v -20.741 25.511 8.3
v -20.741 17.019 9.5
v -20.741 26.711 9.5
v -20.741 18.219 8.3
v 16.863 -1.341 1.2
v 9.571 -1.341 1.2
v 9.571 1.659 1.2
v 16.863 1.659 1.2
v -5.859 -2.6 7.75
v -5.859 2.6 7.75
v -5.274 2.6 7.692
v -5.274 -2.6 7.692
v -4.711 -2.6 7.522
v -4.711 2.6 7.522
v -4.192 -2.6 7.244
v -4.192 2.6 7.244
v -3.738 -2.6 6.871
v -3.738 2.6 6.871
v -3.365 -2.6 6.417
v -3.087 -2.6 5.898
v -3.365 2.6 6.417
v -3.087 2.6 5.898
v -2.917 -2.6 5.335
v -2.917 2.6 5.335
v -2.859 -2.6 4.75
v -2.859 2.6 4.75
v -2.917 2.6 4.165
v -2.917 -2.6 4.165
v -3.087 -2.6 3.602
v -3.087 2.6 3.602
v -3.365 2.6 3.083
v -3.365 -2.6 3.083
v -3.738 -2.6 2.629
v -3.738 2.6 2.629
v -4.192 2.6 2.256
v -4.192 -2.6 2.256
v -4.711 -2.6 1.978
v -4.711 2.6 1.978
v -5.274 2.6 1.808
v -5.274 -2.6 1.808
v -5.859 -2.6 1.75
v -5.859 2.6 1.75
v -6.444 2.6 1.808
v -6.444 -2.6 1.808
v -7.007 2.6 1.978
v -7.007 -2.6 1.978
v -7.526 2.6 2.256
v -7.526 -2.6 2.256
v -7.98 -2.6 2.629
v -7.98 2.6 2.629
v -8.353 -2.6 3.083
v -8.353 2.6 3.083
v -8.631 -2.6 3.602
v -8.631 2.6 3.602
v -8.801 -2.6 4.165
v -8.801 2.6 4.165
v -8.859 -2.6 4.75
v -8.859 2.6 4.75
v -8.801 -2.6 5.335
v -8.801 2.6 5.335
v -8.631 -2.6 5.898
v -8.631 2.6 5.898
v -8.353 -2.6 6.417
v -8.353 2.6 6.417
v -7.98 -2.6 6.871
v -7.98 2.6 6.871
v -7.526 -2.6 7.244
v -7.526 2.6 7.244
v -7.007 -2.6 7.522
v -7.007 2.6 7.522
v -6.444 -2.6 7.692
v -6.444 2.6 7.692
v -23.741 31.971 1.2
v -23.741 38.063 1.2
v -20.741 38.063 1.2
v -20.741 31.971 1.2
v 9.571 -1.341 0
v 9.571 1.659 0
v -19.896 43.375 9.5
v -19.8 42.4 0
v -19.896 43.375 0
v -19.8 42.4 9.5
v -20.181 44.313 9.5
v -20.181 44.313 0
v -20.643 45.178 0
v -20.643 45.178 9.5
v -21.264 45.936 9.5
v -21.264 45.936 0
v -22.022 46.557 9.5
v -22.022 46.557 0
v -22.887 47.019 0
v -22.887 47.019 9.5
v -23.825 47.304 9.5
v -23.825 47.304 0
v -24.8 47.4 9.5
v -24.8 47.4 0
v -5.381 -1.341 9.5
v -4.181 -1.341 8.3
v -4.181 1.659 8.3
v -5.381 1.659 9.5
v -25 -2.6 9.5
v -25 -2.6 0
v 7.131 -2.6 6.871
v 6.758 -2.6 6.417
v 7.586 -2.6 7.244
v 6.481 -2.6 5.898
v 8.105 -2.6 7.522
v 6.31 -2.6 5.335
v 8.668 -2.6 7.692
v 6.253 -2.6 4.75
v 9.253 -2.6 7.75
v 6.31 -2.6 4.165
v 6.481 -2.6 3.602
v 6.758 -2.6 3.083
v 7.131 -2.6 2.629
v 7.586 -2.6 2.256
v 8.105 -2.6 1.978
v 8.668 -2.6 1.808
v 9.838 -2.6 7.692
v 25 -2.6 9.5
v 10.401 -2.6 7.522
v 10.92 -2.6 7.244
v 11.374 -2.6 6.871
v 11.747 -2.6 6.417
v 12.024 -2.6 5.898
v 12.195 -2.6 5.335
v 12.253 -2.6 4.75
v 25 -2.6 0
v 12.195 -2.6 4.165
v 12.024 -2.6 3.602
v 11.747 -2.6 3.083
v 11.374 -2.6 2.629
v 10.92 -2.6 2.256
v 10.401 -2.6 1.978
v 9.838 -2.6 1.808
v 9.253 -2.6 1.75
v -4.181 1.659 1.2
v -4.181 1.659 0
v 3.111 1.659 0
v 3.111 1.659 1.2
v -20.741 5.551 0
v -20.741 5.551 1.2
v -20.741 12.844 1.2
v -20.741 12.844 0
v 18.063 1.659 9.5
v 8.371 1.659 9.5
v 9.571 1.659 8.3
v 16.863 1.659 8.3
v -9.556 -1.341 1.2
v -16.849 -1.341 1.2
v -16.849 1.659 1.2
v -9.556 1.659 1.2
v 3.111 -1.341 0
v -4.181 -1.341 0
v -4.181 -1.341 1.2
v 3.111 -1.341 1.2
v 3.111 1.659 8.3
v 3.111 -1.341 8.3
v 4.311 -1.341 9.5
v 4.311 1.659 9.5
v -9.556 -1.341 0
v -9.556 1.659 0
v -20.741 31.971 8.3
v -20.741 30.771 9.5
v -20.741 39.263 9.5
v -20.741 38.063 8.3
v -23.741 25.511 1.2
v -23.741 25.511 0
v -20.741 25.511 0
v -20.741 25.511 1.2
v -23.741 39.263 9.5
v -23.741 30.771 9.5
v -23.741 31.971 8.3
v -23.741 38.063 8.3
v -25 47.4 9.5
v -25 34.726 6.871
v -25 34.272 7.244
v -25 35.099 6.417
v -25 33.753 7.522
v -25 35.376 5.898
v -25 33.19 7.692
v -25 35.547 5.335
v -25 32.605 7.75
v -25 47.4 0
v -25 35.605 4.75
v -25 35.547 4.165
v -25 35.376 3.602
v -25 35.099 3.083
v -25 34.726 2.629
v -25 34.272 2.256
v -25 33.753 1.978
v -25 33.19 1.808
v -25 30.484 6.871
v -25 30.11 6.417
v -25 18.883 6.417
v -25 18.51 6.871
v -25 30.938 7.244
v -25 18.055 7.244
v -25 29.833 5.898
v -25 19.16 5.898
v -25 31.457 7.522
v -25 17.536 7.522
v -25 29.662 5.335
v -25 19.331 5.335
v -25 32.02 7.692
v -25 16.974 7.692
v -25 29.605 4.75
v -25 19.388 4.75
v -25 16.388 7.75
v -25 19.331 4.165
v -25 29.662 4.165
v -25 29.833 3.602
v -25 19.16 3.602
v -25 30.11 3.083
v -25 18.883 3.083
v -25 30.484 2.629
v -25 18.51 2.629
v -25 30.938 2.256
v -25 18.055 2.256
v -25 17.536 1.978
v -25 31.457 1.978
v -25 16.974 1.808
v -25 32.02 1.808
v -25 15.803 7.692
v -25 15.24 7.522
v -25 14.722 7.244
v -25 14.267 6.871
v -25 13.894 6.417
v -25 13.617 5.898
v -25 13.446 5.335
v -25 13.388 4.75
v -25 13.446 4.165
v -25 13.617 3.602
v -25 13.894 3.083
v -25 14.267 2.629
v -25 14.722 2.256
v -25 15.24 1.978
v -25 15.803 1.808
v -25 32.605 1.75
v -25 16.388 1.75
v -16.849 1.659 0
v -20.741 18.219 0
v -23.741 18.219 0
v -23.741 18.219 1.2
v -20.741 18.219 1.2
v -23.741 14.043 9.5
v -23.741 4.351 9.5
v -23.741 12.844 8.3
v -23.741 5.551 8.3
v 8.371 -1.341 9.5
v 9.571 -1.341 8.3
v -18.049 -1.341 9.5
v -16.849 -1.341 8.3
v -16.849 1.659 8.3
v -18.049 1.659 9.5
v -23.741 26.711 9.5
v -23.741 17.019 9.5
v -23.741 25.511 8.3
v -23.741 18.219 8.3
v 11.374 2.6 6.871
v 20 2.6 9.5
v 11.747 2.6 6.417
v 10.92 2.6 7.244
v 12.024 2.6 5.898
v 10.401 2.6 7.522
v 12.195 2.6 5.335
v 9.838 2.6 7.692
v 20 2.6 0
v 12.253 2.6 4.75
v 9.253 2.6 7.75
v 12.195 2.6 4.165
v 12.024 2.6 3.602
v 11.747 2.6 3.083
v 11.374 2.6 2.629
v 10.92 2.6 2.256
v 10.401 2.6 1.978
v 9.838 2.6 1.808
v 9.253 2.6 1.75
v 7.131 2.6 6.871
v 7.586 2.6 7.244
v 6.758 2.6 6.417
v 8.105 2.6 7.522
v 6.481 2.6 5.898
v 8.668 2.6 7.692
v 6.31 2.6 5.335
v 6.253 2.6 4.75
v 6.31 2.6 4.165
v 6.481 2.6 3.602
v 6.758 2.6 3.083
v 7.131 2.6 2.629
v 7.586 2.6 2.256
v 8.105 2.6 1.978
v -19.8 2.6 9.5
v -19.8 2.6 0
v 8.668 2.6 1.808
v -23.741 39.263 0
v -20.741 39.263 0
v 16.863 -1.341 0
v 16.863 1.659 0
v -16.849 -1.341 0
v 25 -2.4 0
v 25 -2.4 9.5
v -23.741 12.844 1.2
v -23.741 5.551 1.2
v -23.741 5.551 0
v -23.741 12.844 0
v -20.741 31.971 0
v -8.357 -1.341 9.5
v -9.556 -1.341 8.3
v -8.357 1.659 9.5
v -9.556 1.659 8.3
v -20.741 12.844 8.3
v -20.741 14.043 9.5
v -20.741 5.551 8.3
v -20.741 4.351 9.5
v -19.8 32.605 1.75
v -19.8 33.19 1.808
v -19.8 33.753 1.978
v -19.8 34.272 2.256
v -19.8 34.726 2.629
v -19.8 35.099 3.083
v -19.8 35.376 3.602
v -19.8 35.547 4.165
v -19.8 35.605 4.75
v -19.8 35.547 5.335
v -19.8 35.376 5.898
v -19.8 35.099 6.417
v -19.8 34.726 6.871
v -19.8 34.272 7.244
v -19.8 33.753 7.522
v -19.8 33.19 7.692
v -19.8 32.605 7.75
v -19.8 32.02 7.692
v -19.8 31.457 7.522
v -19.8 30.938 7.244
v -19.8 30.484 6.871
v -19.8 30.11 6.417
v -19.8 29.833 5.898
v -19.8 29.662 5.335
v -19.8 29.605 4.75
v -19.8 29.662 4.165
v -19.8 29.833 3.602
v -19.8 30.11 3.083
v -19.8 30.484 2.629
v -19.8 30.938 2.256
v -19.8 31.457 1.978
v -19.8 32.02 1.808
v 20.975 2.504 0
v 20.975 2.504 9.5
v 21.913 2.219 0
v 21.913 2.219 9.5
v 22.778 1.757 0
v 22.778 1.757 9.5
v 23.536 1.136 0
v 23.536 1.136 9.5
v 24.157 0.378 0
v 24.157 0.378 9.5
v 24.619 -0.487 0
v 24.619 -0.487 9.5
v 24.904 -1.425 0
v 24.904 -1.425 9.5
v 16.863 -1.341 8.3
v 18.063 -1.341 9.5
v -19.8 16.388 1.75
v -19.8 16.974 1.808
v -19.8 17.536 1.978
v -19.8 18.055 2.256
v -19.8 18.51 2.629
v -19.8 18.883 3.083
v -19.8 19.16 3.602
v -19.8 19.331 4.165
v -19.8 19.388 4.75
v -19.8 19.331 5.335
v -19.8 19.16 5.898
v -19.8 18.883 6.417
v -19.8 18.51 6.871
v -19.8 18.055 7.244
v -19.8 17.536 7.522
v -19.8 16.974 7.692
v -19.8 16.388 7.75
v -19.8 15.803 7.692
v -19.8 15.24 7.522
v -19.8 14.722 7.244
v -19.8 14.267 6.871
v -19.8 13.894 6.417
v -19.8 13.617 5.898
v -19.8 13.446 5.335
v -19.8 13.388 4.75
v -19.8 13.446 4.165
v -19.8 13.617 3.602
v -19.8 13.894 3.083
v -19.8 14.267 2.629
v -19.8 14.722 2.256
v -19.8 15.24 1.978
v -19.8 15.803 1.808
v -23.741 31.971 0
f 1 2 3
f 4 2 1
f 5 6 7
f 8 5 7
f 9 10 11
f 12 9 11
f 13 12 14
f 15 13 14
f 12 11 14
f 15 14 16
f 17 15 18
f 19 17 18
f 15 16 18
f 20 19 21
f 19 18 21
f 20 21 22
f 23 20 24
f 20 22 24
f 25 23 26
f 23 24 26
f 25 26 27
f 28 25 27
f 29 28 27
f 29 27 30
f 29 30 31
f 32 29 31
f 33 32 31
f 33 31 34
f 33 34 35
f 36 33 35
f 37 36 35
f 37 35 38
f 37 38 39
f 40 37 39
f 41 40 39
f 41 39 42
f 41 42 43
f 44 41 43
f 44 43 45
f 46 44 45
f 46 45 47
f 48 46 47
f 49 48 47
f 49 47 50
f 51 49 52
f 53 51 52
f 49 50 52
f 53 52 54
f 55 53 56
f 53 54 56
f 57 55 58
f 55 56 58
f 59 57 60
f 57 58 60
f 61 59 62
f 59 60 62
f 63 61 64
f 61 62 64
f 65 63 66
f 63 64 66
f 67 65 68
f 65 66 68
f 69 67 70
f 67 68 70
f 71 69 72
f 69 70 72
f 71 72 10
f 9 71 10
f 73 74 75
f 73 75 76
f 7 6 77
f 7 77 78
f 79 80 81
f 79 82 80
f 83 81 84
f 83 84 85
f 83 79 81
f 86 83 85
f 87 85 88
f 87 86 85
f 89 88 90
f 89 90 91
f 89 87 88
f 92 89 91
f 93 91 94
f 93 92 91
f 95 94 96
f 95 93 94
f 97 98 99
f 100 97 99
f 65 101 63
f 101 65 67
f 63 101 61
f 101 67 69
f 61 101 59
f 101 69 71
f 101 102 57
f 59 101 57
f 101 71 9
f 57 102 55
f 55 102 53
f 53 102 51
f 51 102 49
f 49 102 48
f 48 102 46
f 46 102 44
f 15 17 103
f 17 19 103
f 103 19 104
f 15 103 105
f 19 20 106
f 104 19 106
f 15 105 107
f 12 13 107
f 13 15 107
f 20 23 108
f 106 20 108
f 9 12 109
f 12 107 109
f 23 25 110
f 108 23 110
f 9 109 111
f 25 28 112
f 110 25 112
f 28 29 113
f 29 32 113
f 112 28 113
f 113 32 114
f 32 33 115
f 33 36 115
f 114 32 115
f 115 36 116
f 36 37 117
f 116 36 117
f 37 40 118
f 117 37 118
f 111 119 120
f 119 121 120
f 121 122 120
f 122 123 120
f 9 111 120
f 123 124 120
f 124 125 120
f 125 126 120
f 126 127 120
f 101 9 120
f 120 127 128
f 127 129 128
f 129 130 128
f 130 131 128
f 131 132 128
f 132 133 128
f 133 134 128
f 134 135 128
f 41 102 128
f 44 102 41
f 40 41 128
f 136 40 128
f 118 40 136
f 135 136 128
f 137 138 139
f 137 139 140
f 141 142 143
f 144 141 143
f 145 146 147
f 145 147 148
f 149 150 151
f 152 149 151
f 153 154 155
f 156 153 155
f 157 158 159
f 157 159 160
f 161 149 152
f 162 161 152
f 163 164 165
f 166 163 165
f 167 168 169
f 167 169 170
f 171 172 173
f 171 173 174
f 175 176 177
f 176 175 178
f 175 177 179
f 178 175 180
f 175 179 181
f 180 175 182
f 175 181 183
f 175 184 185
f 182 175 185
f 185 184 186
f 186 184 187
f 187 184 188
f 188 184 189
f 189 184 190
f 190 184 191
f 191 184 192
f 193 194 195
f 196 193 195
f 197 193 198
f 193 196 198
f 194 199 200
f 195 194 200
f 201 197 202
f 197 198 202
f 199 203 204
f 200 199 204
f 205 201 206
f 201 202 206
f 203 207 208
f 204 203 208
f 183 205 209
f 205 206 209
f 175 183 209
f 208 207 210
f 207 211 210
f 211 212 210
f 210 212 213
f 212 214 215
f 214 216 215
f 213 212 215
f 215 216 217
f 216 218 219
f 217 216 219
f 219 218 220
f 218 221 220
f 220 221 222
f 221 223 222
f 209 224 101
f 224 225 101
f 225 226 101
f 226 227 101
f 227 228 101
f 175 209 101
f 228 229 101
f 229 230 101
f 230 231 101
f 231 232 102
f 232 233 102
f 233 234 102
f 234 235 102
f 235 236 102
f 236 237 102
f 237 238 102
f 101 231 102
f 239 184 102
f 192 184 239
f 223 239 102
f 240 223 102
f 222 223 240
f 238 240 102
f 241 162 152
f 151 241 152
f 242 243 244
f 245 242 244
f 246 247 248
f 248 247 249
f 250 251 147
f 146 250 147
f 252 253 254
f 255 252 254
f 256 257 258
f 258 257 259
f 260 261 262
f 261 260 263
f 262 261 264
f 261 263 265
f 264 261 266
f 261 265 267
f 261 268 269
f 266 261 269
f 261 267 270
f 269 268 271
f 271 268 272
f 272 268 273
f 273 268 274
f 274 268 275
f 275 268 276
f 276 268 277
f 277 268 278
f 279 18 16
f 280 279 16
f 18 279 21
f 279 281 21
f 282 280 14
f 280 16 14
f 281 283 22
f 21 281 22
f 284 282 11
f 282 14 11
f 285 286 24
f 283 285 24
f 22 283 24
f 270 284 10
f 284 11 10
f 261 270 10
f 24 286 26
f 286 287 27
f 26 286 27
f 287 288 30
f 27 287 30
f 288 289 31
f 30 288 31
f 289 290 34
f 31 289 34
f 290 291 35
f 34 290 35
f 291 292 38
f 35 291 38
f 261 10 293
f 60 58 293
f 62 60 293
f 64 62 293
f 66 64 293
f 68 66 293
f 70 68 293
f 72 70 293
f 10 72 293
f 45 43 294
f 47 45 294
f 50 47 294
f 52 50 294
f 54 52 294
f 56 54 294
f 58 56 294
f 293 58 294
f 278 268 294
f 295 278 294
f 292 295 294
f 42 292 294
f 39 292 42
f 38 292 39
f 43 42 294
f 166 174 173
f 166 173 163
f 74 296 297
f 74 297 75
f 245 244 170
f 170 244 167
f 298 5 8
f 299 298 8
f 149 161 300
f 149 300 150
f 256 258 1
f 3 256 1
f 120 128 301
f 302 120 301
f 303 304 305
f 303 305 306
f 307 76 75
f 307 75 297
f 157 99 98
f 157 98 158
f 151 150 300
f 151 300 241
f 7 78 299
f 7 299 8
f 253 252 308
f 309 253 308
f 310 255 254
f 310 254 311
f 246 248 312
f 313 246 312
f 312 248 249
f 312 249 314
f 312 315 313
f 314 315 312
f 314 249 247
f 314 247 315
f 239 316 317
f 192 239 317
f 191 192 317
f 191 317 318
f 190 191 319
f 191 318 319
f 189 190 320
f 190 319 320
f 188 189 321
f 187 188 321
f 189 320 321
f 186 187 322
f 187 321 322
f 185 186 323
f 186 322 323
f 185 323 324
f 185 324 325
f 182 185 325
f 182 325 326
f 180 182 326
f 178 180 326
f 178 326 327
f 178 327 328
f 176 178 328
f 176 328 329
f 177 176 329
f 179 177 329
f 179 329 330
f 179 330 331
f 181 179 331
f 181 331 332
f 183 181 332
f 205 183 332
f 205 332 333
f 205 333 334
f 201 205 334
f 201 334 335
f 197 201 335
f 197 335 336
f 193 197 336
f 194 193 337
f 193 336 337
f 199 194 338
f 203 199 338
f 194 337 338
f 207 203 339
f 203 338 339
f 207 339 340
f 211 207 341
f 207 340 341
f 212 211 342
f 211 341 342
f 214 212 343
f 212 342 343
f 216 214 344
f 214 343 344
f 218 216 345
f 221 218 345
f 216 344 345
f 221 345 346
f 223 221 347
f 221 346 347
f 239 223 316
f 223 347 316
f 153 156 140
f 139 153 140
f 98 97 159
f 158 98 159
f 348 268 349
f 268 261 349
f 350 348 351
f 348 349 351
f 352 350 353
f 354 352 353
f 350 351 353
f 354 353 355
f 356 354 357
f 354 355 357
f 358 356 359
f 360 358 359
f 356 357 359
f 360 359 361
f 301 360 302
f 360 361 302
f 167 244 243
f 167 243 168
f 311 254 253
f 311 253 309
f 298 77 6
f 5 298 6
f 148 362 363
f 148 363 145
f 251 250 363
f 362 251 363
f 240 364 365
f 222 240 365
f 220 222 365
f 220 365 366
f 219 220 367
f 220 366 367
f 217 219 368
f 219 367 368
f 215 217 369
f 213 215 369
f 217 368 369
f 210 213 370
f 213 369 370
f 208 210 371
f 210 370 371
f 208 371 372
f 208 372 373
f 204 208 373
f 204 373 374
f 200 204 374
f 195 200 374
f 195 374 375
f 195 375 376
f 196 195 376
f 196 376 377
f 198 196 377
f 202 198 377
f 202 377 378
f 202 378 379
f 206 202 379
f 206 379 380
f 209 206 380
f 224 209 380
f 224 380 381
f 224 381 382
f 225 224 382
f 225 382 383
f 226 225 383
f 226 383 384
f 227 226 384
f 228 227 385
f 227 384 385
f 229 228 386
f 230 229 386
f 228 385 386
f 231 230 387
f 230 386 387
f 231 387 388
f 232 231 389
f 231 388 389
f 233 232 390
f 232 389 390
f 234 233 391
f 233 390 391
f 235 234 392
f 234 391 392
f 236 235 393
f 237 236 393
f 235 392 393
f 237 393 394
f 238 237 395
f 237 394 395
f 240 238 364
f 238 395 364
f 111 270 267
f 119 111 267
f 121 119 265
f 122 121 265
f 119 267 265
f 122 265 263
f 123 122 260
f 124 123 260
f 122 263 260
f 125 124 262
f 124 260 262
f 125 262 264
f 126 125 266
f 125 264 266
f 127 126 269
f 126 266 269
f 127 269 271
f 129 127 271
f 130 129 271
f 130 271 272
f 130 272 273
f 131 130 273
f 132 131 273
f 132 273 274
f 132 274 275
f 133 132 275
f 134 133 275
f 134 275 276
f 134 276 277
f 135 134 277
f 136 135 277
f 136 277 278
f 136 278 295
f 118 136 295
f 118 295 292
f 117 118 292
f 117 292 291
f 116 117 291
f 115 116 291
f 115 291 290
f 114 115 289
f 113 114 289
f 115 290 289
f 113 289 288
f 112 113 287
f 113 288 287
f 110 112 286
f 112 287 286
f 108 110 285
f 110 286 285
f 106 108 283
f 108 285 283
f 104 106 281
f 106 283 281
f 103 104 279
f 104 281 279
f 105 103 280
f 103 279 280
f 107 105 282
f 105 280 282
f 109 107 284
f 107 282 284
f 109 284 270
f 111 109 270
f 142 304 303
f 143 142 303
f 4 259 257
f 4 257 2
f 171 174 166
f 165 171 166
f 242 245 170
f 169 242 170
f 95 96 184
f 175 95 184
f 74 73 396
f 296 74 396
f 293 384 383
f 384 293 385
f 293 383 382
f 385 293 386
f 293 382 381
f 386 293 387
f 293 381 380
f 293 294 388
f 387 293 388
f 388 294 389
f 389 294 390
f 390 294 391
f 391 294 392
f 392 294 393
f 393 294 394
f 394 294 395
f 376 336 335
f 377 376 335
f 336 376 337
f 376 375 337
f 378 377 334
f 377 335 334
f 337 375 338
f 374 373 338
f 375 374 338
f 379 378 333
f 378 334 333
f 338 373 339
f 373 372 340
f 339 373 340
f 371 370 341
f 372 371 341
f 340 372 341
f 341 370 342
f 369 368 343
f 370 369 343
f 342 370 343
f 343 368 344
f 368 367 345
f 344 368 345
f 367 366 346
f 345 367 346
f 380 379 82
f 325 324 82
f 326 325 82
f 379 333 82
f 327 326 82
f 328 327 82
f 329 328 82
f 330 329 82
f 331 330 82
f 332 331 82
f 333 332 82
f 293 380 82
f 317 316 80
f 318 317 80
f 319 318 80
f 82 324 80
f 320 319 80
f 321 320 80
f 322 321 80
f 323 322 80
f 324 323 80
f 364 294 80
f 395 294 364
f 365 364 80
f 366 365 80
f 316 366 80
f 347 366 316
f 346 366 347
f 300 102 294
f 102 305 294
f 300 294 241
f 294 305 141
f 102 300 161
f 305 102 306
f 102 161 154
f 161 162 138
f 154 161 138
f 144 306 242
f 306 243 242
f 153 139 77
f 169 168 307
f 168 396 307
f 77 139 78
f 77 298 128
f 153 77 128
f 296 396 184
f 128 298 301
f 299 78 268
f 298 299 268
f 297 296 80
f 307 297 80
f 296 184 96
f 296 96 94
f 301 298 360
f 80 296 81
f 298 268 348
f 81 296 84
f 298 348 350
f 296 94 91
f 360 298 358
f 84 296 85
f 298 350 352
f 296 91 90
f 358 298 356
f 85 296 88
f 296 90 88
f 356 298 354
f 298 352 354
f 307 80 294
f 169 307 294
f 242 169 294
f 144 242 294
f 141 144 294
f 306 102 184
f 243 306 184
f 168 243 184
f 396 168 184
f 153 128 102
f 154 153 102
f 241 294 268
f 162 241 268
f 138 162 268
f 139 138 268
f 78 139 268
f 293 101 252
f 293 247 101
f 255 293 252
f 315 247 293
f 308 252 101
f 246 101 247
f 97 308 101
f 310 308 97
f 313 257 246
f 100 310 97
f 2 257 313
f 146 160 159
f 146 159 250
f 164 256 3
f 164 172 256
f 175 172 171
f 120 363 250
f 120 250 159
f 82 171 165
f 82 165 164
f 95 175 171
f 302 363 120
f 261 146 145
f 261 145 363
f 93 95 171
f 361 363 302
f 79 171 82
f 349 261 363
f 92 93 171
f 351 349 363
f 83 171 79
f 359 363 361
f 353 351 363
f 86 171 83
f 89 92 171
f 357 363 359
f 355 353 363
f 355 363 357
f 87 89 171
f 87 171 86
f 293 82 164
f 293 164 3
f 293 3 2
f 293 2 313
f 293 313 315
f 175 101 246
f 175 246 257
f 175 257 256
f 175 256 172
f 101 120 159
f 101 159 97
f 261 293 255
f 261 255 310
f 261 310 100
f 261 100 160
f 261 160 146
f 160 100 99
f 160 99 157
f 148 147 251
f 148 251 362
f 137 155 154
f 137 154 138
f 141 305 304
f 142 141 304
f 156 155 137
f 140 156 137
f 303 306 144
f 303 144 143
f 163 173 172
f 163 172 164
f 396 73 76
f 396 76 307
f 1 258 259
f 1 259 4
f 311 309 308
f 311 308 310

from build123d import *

# Parameters (mm, degrees)
EXTRUDE_1_DEPTH      = 9.5
SKETCH_2_R           = 3
CUT_EXTRUDE_1_DEPTH  = 66.909407523
SKETCH_4_R           = 3
CUT_EXTRUDE_2_DEPTH  = 53.175568995
FILLET_1_R           = 5
SKETCH_5_W           = 3
SKETCH_5_H           = 7.292258694
SKETCH_5_H_2         = 7.292258695
SKETCH_5_W_2         = 7.292258695
SKETCH_5_H_3         = 3
SKETCH_5_W_3         = 7.292258694
CUT_EXTRUDE_3_DEPTH  = 1.2
CHAMFER_1_SIZE       = 1.2
CHAMFER_2_SIZE       = 1.2
MIRROR_START         = -23.741274046
MIRROR_1_OUTLINE_W   = 7.292258694
MIRROR_1_OUTLINE_H   = 1.2
MIRROR_1_OUTLINE_W_2 = 7.292258695
MIRROR_1_DEPTH       = 3
MIRROR_START_2       = -16.84868645
MIRROR_1_2_OUTLINE_W = 3
MIRROR_1_2_OUTLINE_H = 1.2
MIRROR_1_2_DEPTH     = 7.292258695
MIRROR_START_3       = -4.181235969
MIRROR_1_3_OUTLINE_W = 3
MIRROR_1_3_OUTLINE_H = 1.2
MIRROR_1_3_DEPTH     = 7.292258694
MIRROR_START_4       = 9.571089537
MIRROR_1_4_OUTLINE_W = 3
MIRROR_1_4_OUTLINE_H = 1.2
MIRROR_1_4_DEPTH     = 7.292258694


# Read off the part's stored shape, not the designer's step: 镜向1
with BuildPart() as part:
    # 草图1 → 凸台-拉伸1 (new body)
    with BuildSketch(Plane.XY):
        Polygon((-19.8, 2.6), (-19.8, 47.4), (-25, 47.4), (-25, -2.6), (25, -2.6), (25, 2.6), align=None)
    extrude(amount=EXTRUDE_1_DEPTH)

    # 草图2 → 切除-拉伸1 (cut, through all)
    with BuildSketch(Plane(origin=(-19.8, 0, 0), x_dir=(0, 0, -1), z_dir=(1, 0, 0))):
        with Locations((-4.75, 32.604835918)):
            Circle(SKETCH_2_R)
        with Locations((-4.75, 16.388429447)):
            Circle(SKETCH_2_R)
    extrude(amount=-CUT_EXTRUDE_1_DEPTH, mode=Mode.SUBTRACT)

    # 草图4 → 切除-拉伸2 (cut, through all)
    with BuildSketch(Plane(origin=(0, 2.6, 0), x_dir=(1, 0, 0), z_dir=(0, 1, 0))):
        with Locations(Location((9.252806551, -4.75, 0), (0, 0, 270))):
            Circle(SKETCH_4_R)
        with Locations(Location((-5.859043595, -4.75, 0), (0, 0, 270))):
            Circle(SKETCH_4_R)
    extrude(amount=-CUT_EXTRUDE_2_DEPTH, mode=Mode.SUBTRACT)

    # 圆角1
    fillet_1_edges = [part.edges().sort_by_distance(p)[0] for p in [
        (-19.8, 47.4, 4.75),
        (25, 2.6, 4.75),
    ]]
    fillet(fillet_1_edges, radius=FILLET_1_R)

    # 草图5 → 切除-拉伸3 (cut)
    with BuildSketch(Plane.XY.offset(9.5)):
        with Locations((-22.241274046, 21.864893378)):
            Rectangle(SKETCH_5_W, SKETCH_5_H)
        with Locations((-22.241274046, 35.617218884)):
            Rectangle(SKETCH_5_W, SKETCH_5_H)
        with Locations((-22.241274046, 9.197442898)):
            Rectangle(SKETCH_5_W, SKETCH_5_H_2)
        with Locations((-13.202557103, 0.158725954)):
            Rectangle(SKETCH_5_W_2, SKETCH_5_H_3)
        with Locations((-0.535106622, 0.158725954)):
            Rectangle(SKETCH_5_W_3, SKETCH_5_H_3)
        with Locations((13.217218884, 0.158725954)):
            Rectangle(SKETCH_5_W_3, SKETCH_5_H_3)
    extrude(amount=-CUT_EXTRUDE_3_DEPTH, mode=Mode.SUBTRACT)

    # 倒角1
    chamfer_1_edges = [part.edges().sort_by_distance(p)[0] for p in [
        (-22.241274046, 5.55131355, 9.5),
        (-22.241274046, 12.843572245, 9.5),
        (-22.241274046, 18.218764031, 9.5),
        (-22.241274046, 25.511022725, 9.5),
        (-22.241274046, 39.263348231, 8.3),
        (-22.241274046, 31.971089537, 9.5),
    ]]
    chamfer(chamfer_1_edges, length=CHAMFER_1_SIZE - 0.0001)  # a hair under: the kernel refuses the full size

    # 倒角2
    chamfer_2_edges = [part.edges().sort_by_distance(p)[0] for p in [
        (16.863348231, 0.158725954, 9.5),
        (9.571089537, 0.158725954, 9.5),
        (3.111022725, 0.158725954, 9.5),
        (-4.181235969, 0.158725954, 9.5),
        (-9.556427755, 0.158725954, 9.5),
        (-16.84868645, 0.158725954, 9.5),
    ]]
    chamfer(chamfer_2_edges, length=CHAMFER_2_SIZE - 0.0001)  # a hair under: the kernel refuses the full size

    # 镜向1 outline → 镜向1 (cut)
    with BuildSketch(Plane.YZ.offset(MIRROR_START)):
        Polygon((31.971089537, 1.2), (31.971089537, 0), (39.263348231, 0), (38.063348231, 1.2), align=None)
        with Locations((21.864893378, 0.6)):
            Rectangle(MIRROR_1_OUTLINE_W, MIRROR_1_OUTLINE_H)
        with Locations((9.197442898, 0.6)):
            Rectangle(MIRROR_1_OUTLINE_W_2, MIRROR_1_OUTLINE_H)
    extrude(amount=MIRROR_1_DEPTH, mode=Mode.SUBTRACT)

    # Mirror 1 2 outline → Mirror 1 2 (cut)
    with BuildSketch(Plane.YZ.offset(MIRROR_START_2)):
        with Locations((0.158725954, 0.6)):
            Rectangle(MIRROR_1_2_OUTLINE_W, MIRROR_1_2_OUTLINE_H)
    extrude(amount=MIRROR_1_2_DEPTH, mode=Mode.SUBTRACT)

    # Mirror 1 3 outline → Mirror 1 3 (cut)
    with BuildSketch(Plane.YZ.offset(MIRROR_START_3)):
        with Locations((0.158725954, 0.6)):
            Rectangle(MIRROR_1_3_OUTLINE_W, MIRROR_1_3_OUTLINE_H)
    extrude(amount=MIRROR_1_3_DEPTH, mode=Mode.SUBTRACT)

    # Mirror 1 4 outline → Mirror 1 4 (cut)
    with BuildSketch(Plane.YZ.offset(MIRROR_START_4)):
        with Locations((0.158725954, 0.6)):
            Rectangle(MIRROR_1_4_OUTLINE_W, MIRROR_1_4_OUTLINE_H)
    extrude(amount=MIRROR_1_4_DEPTH, mode=Mode.SUBTRACT)


solid = part.part
